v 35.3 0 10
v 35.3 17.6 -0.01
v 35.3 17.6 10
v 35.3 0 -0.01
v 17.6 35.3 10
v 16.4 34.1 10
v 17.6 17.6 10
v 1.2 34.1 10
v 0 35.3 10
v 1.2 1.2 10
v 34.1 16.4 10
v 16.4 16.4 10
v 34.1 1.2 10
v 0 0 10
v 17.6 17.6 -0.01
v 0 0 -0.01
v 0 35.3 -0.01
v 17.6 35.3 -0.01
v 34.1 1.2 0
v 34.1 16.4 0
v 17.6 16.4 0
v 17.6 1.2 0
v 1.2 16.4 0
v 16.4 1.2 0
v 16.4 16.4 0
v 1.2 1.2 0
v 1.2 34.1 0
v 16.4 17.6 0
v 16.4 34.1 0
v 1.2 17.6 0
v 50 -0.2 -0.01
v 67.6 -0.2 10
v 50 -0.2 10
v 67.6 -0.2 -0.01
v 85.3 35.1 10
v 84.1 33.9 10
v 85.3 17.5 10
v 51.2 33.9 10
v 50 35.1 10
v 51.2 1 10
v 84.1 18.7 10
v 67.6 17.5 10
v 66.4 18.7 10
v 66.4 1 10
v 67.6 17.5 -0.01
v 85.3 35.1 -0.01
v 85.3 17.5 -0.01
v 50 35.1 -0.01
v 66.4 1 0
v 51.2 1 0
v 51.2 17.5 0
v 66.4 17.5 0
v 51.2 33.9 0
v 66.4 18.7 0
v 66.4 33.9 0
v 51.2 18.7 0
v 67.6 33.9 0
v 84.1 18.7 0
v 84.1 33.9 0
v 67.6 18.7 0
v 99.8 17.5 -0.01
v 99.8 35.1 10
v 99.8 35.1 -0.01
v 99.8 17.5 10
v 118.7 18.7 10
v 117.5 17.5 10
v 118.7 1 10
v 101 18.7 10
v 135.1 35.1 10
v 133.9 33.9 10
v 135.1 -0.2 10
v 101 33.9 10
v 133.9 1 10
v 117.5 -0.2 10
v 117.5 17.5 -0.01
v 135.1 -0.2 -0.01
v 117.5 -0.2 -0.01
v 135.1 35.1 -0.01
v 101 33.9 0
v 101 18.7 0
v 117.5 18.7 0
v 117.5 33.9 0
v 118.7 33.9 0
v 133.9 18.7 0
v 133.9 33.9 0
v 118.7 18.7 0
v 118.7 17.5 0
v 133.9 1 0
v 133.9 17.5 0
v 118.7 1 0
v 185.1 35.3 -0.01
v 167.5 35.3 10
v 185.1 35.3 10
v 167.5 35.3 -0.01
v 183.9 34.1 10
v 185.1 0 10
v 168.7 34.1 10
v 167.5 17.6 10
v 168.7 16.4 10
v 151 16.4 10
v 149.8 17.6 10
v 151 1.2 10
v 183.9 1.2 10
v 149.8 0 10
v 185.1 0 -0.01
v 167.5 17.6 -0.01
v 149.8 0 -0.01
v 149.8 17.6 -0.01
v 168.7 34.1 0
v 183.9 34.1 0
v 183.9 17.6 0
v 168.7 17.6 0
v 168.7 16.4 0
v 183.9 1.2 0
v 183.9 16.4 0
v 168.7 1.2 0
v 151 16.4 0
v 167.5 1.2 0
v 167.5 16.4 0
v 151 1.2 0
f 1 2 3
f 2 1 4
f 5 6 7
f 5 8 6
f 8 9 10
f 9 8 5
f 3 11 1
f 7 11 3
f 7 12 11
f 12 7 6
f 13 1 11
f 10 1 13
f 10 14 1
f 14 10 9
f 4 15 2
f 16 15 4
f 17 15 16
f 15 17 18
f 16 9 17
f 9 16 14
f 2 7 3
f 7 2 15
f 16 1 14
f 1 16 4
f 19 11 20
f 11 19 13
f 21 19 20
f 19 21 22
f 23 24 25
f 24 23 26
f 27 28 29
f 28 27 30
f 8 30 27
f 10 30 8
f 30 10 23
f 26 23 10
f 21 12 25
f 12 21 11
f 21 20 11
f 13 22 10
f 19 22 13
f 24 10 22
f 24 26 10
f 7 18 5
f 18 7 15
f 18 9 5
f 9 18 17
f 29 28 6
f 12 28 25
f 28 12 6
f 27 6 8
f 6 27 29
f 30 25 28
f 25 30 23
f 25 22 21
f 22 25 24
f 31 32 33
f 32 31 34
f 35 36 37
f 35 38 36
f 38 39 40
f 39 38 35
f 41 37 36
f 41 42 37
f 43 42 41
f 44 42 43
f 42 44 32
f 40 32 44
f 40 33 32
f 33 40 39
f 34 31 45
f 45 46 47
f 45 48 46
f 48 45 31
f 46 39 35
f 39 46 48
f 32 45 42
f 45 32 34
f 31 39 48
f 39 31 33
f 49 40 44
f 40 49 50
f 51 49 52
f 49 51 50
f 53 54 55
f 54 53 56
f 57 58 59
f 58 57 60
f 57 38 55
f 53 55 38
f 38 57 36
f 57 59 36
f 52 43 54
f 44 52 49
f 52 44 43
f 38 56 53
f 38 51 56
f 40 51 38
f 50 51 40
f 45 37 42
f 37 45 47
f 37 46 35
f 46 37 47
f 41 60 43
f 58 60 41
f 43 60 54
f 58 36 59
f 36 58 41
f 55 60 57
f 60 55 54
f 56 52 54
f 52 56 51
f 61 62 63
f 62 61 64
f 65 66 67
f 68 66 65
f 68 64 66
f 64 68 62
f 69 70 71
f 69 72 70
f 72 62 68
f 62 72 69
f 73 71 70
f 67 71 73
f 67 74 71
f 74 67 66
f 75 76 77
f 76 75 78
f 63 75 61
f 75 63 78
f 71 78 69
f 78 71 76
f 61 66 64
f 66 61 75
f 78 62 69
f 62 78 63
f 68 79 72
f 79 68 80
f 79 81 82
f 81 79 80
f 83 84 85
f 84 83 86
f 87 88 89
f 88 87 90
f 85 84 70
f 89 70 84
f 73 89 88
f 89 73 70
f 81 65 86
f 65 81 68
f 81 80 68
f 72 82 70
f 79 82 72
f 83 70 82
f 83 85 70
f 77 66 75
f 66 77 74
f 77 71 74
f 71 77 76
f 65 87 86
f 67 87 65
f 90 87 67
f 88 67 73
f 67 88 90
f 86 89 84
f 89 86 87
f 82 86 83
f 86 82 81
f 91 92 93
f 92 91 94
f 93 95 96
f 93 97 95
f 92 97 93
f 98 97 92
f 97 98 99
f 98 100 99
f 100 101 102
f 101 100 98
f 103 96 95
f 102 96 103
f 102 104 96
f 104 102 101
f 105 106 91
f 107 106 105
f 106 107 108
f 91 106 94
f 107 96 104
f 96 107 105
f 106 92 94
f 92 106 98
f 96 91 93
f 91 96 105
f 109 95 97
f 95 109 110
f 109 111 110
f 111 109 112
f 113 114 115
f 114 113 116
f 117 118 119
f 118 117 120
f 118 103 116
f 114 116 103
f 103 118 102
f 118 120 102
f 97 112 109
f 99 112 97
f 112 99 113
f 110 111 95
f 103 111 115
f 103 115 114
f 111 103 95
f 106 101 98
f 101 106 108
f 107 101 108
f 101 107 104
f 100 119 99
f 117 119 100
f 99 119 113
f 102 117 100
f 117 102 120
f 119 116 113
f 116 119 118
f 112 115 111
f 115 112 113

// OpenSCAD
// file: ../../Base/Boxes.scad
// Fischertechnik Box Foundation
// Pre-designed Boxes

use <Constants.scad>

include <PlacementOptions.scad>

box190Width = 190;
box190Depth = 130;
box130Width = 130;
box130Depth = 95;
boxUsageHeight = 33.9;
boxWallThickness = 2.4;
boxBaseThickness = 1.0;

// getBoxWallThickness()
// Gets the wall thickness of a Fischertechnik Box

function getBoxWallThickness() = boxWallThickness;

// Gets the usable height of a fischertechnik box
function getBoxUsageHeight() = boxUsageHeight;

// Gets the thickness of the Fischertechnik box base.
function getBoxBaseThickness() = boxBaseThickness;

// Gets the usable inner space of a Box 190 as an x/y-list
function getBox190Space() = [
    box190Width - 2*getBoxWallThickness(), 
    box190Depth - 2*getBoxWallThickness() ];

// Imports the Fischertechnik empty box 130x190 mm and places it at position 0,0
// 190x130 are the outer sizes, the inner space is slightly smaller. Use getBox190Space() to get the inner sizes.
// This module needs the STL file "Fischertechnik Box 130x190.stl" in the library path.
// The box is positioned that the usable inner space is at the 0,0,0 position. The

module Box190() {
    translate([-getBoxWallThickness(),-getBoxWallThickness(),-getBoxBaseThickness()])
        import("Fischertechnik Box 130x190.stl", convexity=3);
}

// Gets the usable inner space of a Box 130 as an x/y-list
function getBox130Space() = [
    box130Width - 2*getBoxWallThickness(), 
    box130Depth - 2*getBoxWallThickness() ];

// Imports the Fischertechnik empty box 95x130 mm and places it at position 0,0
// 190x130 are the outer sizes, the inner space is slightly smaller. Use getBox190Space() to get the inner sizes.
// This module needs the STL file "Fischertechnik Box 95x130.stl" in the library path.
// The box is positioned that the usable inner space is at the 0,0,0 position. The

module Box130() {
    translate([-getBoxWallThickness(),-getBoxWallThickness(),-getBoxBaseThickness()])
        import("Fischertechnik Box 95x130.stl", convexity=3);
}

// Creates a web at the specified box walls
// corner 0 = LowerLeft, 1 = UpperLeft, 2 = UpperRight, 3 = LowerRight
// side 0 = LeftOfCorner, 1 = RightOfCorner
// distance = Distance in mm from the corner
// box = inner width and depth of the box (default: Box 190)
// webWidth = length of the web (default is 3 mms)
// webThickness = thickness of the web (default is 1 mm)

module BoxWeb(corner, side, distance, box=getBox190Space(), webWidth=3, webThickness=1.0) {
    sink = getBoxWallThickness()/2;

    width = (corner % 2 == 0) ? 
            (side == LeftOfCorner ? webWidth : webThickness) :
            (side == LeftOfCorner ? webThickness : webWidth);

    depth = (corner % 2 == 0) ? 
            (side == RightOfCorner ? webWidth : webThickness) :
            (side == RightOfCorner ? webThickness : webWidth);
    
    xDiff = corner == LowerLeft ? 
                (side == LeftOfCorner ? -sink : distance) :
            (corner == UpperLeft ?                
                (side == LeftOfCorner ? distance : -sink) :
            (corner == UpperRight ?
                (side == LeftOfCorner ? box.x-webWidth+sink : box.x-distance-webThickness) :
                (side == LeftOfCorner ? box.x-distance-webThickness: box.x-webWidth+sink)));

    yDiff = corner == LowerLeft ? 
                (side == RightOfCorner ? -sink : distance) :
            (corner == UpperLeft ?
                (side == RightOfCorner ? box.y-distance : box.y-webWidth+sink) :
            (corner == UpperRight ?
                (side == RightOfCorner ? box.y-webWidth+sink : box.y-distance) :
                (side == RightOfCorner ? distance : -sink)));
    
    translate([xDiff, yDiff, -getExcess()])
        cube([width, depth, boxUsageHeight + 2*getExcess()]);
}
// file: ../../Base/Rotation.scad
// Fischertechnik Box Foundation
// Geometry Helpers Rotation

include <PlacementOptions.scad>

// getRotatedSpace(space, rotation=NoRotation)
// Rotates the space dependent on the specified rotation

function getRotatedSpace(space, rotation=NoRotation) = [
    (rotation == Rotate90 || rotation == Rotate270) ? space.y : space.x,
    (rotation == Rotate90 || rotation == Rotate270) ? space.x : space.y
];

// Rotates the given space around the fixed left lower corner
// space = the space the children needs as width/depth list [width,depth]
// rotation = 0 Rotate0 degrees, 1 Rotate90 degrees, 2 Rotate180 degrees, 3 Rotate270 degrees (equivalent to -90)

module RotateFix(space, rotation=Rotate0) {
    dy = (rotation == Rotate0 || rotation == Rotate270) ? 0 :
        (rotation == Rotate90) ? space.x :
        space.y;
    dx = (rotation < Rotate180) ? 0 :
        (rotation == Rotate180) ? space.x :
        space.y;
    
    translate([dx, dy, 0])
        rotate([0, 0, rotations[rotation]])
            children();
}
// file: ../../Base/Alignment.scad
// Fischertechnik Box Foundation
// Geometry Helpers Alignment

include <PlacementOptions.scad>

// getAlignedX(elementWidth, spaceWidth, align=AlignRight, offset=0)
// Gets the aligned X offset of an element with the given
// width in the given space.
// elementWidth = The width of the element to positon
// spaceWidth = The space where the element should be aligned
// align = 0 AlignLeft, 1 AlignCenter, 2 AlignRight
// offset = an optional offset from the aligned position. When
// aligned left or centered, then positive values are in X direction.
// When aligned right then positive values are in negative X direction.

function getAlignedX(elementWidth, spaceWidth, align=AlignRight, offset=0) =
    (align == AlignLeft) ?
        offset :
        ((align == AlignCenter) ?
        (spaceWidth - elementWidth)/2 + offset :
        spaceWidth - offset - elementWidth);

// getAlignedY(elementDepth, spaceDepth, align=AlignTop, offset=0)
// Gets the aligned Y offset of an element with the given
// depth in the given space.
// elementDepth = The depth of the element to positon
// spaceDepth = The space where the element should be aligned
// align = 0 AlignBottom, 1 AlignCenter, 2 AlignTop
// offset = an optional offset from the aligned position. When
// aligned bottom or centered, then positive values are in Y direction.
// When aligned top then positive values are in negative Y direction.

function getAlignedY(elementDepth, spaceDepth, align=AlignTop, offset=0) =
    (align == AlignBottom) ?
        offset :
        ((align == AlignCenter) ?
        (spaceDepth - elementDepth)/2 + offset :
        spaceDepth - offset - elementDepth);
// file: ../../Base/Constants.scad
// Fischertechnik Box Foundation
// Constants

// Constant values necessary for multiple elements

// Base constants
dividerThickness = 1.2;
excess = 0.01;
fragments = 90;
tolerance = 0.8;

// Gets the thickness of a divider 
function getDividerThickness() = dividerThickness;

// Gets the excess that is used to merge walls into each other
function getExcess() = excess;

// Gets amount of fragments of a cylinder
function getFragments() = fragments;

// Gets the inner tolerance of a frame to each side
function getTolerance() = tolerance;


// Fischertechnik specific constants
axisDiameter = 4;
axisBottomDiameter = axisDiameter + 1;
standardEdgeDistance = 2.5;
standardWebDistance = 11.5;
standardCornerLength = 15;
tubeWallFactor = 1.6;

// Gets axis diameter
function getAxisDiameter() = axisDiameter;

// Gets axis bottom diameter for thicker part at the bottom
function getAxisBottomDiameter() = axisBottomDiameter;

// gets the standard distance to the wall of the box for dockable frames with webs
function getStandardEdgeDistance() = standardEdgeDistance;

// gets the standard distance of each web to the corner of the dockable frame
function getStandardWebDistance() = standardWebDistance;

// gets the standard length of the corner walls of a dockable frame
function getStandardCornerLength() = standardCornerLength;

// gets the wall thickness of a tube.
function getTubeWallThickness() = tubeWallFactor * getDividerThickness();
// file: ../../Base/PlacementOptions.scad
// Fischertechnik Box Foundation
// Placement Options

// Alignment
NoAlign = 0;
AlignLeft = 1;
AlignBottom = 2;
AlignCenter = 3;
AlignRight = 4;
AlignTop = 5;

// Element rotation degree steps
rotations = [0, -90, -180, -270];

// Rotation
NoRotation = 0;
Rotate0 = 0;
Rotate90 = 1;
Rotate180 = 2;
Rotate270 = 3;

// Docking (seen from above)
NoDock = -1;
DockLeft = 0;
DockTop = 1;
DockRight = 2;
DockCorner = 2;
DockBottom = 3;

// Web corners
LowerLeft = 0;
UpperLeft = 1;
UpperRight = 2;
LowerRight = 3;

// Web position relative to corner
LeftOfCorner = 0;
RightOfCorner = 1;
// file: ../../Elements/FrameJointBlock.scad
// Fischertechnik Box Library
// Frame for joint block
// 31008, 31009, 31308, 35831, 36223, 172804, 172805

use <../ModelBase/Simple.scad>

width = 32.5;
depth = 15;
height = 10;
tolerance = 0.2;

// getFrameJointBlockSpace()
// Gets the complete space of the joint block frame

function getFrameJointBlockSpace() = getAngledFrameOuterVolume(width, depth, width, depth, height, tolerance = tolerance);

// FrameJointBlock()
// Frame for a joint block

module FrameJointBlock() {
    AngledFrame(width, depth, width, depth, height, tolerance=tolerance);
}

// Test
color("lightgray")
FrameJointBlock();
// file: ../../Base/Placement.scad
// Fischertechnik Box Foundation
// Geometry Helpers Placement

use <Constants.scad>
use <Alignment.scad>
use <Rotation.scad>
use <Boxes.scad>

include <PlacementOptions.scad>

// Place(x=0, y=0, elementSpace=[0,0], alignX=AlignLeft, alignY=AlignBottom, rotation=Rotate0, boxSpace=getBox190Space())
// Places the child at the specified position
// y = Y-Position. This is a relative position when an X aligment is specified.
// x = X-Position. This is a relative position when an Y aligment is specified.
// elementSpace = space of the element to be placed [x,y]
// alignX = -1=NoAlign, 0 AlignLeft, 1 AlignCenter, 3 AlignRight (elementSpace and boxSpace required!)
// alignY = -1=NoAlign, 2 AlignBottom, 1 AlignCenter, 4 AlignTop (elementSpace and boxSpace required!)
// rotation = 0 Rotate0 0 degrees, 1 Rotate90 90 degrees, 
// 2 Rotate180 180 degrees, 3 Rotate270 270 degrees (equivalent to -90)
// boxSpace = Inner space of the box where the placement occurs [x,y] - default is Box 190x130 inner space

module Place(x=0, y=0, elementSpace=[0,0], 
  alignX=AlignLeft, alignY=AlignBottom, 
  rotation=NoRotation, boxSpace=getBox190Space()) {

    module Position(x, y, space, rotation=Rotate0) {
        translate([x, y, 0])
            RotateFix(space, rotation)
                children(0);
    }

    space = getRotatedSpace(elementSpace, rotation);
    alignedX = getAlignedX(space.x, boxSpace.x, alignX, x);
    alignedY = getAlignedY(space.y, boxSpace.y, alignY, y);
    Position(alignedX, alignedY, elementSpace, rotation)
        children(0);
}

// Center(space=getBox130Space(), elementSpace=[0,0])
// space = Space where the children is centered. For cylinder use centered=true and no elementSpace.
// elementSpace = space of the element to be centered [x,y]

module Center(space=getBox190Space(), elementSpace=[0,0]) {
    translate([(space.x - elementSpace.x) / 2, (space.y - elementSpace.y) / 2])
        children(0);
}

// CenterHorizontal(width=0, y=0, offset=0, space=getBox130Space())
// space = Space where the children is centered. For cylinder use centered=true and no elementSpace.
// elementSpace = space of the element to be centered [x,y]

module CenterHorizontal(width=0, y=0, offset=0, space=getBox190Space()) {
    translate([(space.x - width) / 2 + offset, y])
        children(0);
}

// CenterVertical(depth=0, x=0, offset=0, space=getBox130Space())
// space = Space where the children is centered. For cylinder use centered=true and no elementSpace.
// elementSpace = space of the element to be centered [x,y]

module CenterVerticalal(depth=0, x=0, offset=0, space=getBox190Space()) {
    translate([x, (space.y - depth) / 2 + offset])
        children(0);
}
// main file
// Fischertechnik Box Foundation
// Elements
// Test FrameJointBlock

use <../../Base/Placement.scad>
use <../../Elements/FrameJointBlock.scad>

include <../../Base/PlacementOptions.scad>

FrameJointBlock();

Place(50, 0, getFrameJointBlockSpace(), rotation=Rotate90)
    FrameJointBlock();

Place(100, 0, getFrameJointBlockSpace(), rotation=Rotate180)
    FrameJointBlock();

Place(150, 0, getFrameJointBlockSpace(), rotation=Rotate270)
    FrameJointBlock();
